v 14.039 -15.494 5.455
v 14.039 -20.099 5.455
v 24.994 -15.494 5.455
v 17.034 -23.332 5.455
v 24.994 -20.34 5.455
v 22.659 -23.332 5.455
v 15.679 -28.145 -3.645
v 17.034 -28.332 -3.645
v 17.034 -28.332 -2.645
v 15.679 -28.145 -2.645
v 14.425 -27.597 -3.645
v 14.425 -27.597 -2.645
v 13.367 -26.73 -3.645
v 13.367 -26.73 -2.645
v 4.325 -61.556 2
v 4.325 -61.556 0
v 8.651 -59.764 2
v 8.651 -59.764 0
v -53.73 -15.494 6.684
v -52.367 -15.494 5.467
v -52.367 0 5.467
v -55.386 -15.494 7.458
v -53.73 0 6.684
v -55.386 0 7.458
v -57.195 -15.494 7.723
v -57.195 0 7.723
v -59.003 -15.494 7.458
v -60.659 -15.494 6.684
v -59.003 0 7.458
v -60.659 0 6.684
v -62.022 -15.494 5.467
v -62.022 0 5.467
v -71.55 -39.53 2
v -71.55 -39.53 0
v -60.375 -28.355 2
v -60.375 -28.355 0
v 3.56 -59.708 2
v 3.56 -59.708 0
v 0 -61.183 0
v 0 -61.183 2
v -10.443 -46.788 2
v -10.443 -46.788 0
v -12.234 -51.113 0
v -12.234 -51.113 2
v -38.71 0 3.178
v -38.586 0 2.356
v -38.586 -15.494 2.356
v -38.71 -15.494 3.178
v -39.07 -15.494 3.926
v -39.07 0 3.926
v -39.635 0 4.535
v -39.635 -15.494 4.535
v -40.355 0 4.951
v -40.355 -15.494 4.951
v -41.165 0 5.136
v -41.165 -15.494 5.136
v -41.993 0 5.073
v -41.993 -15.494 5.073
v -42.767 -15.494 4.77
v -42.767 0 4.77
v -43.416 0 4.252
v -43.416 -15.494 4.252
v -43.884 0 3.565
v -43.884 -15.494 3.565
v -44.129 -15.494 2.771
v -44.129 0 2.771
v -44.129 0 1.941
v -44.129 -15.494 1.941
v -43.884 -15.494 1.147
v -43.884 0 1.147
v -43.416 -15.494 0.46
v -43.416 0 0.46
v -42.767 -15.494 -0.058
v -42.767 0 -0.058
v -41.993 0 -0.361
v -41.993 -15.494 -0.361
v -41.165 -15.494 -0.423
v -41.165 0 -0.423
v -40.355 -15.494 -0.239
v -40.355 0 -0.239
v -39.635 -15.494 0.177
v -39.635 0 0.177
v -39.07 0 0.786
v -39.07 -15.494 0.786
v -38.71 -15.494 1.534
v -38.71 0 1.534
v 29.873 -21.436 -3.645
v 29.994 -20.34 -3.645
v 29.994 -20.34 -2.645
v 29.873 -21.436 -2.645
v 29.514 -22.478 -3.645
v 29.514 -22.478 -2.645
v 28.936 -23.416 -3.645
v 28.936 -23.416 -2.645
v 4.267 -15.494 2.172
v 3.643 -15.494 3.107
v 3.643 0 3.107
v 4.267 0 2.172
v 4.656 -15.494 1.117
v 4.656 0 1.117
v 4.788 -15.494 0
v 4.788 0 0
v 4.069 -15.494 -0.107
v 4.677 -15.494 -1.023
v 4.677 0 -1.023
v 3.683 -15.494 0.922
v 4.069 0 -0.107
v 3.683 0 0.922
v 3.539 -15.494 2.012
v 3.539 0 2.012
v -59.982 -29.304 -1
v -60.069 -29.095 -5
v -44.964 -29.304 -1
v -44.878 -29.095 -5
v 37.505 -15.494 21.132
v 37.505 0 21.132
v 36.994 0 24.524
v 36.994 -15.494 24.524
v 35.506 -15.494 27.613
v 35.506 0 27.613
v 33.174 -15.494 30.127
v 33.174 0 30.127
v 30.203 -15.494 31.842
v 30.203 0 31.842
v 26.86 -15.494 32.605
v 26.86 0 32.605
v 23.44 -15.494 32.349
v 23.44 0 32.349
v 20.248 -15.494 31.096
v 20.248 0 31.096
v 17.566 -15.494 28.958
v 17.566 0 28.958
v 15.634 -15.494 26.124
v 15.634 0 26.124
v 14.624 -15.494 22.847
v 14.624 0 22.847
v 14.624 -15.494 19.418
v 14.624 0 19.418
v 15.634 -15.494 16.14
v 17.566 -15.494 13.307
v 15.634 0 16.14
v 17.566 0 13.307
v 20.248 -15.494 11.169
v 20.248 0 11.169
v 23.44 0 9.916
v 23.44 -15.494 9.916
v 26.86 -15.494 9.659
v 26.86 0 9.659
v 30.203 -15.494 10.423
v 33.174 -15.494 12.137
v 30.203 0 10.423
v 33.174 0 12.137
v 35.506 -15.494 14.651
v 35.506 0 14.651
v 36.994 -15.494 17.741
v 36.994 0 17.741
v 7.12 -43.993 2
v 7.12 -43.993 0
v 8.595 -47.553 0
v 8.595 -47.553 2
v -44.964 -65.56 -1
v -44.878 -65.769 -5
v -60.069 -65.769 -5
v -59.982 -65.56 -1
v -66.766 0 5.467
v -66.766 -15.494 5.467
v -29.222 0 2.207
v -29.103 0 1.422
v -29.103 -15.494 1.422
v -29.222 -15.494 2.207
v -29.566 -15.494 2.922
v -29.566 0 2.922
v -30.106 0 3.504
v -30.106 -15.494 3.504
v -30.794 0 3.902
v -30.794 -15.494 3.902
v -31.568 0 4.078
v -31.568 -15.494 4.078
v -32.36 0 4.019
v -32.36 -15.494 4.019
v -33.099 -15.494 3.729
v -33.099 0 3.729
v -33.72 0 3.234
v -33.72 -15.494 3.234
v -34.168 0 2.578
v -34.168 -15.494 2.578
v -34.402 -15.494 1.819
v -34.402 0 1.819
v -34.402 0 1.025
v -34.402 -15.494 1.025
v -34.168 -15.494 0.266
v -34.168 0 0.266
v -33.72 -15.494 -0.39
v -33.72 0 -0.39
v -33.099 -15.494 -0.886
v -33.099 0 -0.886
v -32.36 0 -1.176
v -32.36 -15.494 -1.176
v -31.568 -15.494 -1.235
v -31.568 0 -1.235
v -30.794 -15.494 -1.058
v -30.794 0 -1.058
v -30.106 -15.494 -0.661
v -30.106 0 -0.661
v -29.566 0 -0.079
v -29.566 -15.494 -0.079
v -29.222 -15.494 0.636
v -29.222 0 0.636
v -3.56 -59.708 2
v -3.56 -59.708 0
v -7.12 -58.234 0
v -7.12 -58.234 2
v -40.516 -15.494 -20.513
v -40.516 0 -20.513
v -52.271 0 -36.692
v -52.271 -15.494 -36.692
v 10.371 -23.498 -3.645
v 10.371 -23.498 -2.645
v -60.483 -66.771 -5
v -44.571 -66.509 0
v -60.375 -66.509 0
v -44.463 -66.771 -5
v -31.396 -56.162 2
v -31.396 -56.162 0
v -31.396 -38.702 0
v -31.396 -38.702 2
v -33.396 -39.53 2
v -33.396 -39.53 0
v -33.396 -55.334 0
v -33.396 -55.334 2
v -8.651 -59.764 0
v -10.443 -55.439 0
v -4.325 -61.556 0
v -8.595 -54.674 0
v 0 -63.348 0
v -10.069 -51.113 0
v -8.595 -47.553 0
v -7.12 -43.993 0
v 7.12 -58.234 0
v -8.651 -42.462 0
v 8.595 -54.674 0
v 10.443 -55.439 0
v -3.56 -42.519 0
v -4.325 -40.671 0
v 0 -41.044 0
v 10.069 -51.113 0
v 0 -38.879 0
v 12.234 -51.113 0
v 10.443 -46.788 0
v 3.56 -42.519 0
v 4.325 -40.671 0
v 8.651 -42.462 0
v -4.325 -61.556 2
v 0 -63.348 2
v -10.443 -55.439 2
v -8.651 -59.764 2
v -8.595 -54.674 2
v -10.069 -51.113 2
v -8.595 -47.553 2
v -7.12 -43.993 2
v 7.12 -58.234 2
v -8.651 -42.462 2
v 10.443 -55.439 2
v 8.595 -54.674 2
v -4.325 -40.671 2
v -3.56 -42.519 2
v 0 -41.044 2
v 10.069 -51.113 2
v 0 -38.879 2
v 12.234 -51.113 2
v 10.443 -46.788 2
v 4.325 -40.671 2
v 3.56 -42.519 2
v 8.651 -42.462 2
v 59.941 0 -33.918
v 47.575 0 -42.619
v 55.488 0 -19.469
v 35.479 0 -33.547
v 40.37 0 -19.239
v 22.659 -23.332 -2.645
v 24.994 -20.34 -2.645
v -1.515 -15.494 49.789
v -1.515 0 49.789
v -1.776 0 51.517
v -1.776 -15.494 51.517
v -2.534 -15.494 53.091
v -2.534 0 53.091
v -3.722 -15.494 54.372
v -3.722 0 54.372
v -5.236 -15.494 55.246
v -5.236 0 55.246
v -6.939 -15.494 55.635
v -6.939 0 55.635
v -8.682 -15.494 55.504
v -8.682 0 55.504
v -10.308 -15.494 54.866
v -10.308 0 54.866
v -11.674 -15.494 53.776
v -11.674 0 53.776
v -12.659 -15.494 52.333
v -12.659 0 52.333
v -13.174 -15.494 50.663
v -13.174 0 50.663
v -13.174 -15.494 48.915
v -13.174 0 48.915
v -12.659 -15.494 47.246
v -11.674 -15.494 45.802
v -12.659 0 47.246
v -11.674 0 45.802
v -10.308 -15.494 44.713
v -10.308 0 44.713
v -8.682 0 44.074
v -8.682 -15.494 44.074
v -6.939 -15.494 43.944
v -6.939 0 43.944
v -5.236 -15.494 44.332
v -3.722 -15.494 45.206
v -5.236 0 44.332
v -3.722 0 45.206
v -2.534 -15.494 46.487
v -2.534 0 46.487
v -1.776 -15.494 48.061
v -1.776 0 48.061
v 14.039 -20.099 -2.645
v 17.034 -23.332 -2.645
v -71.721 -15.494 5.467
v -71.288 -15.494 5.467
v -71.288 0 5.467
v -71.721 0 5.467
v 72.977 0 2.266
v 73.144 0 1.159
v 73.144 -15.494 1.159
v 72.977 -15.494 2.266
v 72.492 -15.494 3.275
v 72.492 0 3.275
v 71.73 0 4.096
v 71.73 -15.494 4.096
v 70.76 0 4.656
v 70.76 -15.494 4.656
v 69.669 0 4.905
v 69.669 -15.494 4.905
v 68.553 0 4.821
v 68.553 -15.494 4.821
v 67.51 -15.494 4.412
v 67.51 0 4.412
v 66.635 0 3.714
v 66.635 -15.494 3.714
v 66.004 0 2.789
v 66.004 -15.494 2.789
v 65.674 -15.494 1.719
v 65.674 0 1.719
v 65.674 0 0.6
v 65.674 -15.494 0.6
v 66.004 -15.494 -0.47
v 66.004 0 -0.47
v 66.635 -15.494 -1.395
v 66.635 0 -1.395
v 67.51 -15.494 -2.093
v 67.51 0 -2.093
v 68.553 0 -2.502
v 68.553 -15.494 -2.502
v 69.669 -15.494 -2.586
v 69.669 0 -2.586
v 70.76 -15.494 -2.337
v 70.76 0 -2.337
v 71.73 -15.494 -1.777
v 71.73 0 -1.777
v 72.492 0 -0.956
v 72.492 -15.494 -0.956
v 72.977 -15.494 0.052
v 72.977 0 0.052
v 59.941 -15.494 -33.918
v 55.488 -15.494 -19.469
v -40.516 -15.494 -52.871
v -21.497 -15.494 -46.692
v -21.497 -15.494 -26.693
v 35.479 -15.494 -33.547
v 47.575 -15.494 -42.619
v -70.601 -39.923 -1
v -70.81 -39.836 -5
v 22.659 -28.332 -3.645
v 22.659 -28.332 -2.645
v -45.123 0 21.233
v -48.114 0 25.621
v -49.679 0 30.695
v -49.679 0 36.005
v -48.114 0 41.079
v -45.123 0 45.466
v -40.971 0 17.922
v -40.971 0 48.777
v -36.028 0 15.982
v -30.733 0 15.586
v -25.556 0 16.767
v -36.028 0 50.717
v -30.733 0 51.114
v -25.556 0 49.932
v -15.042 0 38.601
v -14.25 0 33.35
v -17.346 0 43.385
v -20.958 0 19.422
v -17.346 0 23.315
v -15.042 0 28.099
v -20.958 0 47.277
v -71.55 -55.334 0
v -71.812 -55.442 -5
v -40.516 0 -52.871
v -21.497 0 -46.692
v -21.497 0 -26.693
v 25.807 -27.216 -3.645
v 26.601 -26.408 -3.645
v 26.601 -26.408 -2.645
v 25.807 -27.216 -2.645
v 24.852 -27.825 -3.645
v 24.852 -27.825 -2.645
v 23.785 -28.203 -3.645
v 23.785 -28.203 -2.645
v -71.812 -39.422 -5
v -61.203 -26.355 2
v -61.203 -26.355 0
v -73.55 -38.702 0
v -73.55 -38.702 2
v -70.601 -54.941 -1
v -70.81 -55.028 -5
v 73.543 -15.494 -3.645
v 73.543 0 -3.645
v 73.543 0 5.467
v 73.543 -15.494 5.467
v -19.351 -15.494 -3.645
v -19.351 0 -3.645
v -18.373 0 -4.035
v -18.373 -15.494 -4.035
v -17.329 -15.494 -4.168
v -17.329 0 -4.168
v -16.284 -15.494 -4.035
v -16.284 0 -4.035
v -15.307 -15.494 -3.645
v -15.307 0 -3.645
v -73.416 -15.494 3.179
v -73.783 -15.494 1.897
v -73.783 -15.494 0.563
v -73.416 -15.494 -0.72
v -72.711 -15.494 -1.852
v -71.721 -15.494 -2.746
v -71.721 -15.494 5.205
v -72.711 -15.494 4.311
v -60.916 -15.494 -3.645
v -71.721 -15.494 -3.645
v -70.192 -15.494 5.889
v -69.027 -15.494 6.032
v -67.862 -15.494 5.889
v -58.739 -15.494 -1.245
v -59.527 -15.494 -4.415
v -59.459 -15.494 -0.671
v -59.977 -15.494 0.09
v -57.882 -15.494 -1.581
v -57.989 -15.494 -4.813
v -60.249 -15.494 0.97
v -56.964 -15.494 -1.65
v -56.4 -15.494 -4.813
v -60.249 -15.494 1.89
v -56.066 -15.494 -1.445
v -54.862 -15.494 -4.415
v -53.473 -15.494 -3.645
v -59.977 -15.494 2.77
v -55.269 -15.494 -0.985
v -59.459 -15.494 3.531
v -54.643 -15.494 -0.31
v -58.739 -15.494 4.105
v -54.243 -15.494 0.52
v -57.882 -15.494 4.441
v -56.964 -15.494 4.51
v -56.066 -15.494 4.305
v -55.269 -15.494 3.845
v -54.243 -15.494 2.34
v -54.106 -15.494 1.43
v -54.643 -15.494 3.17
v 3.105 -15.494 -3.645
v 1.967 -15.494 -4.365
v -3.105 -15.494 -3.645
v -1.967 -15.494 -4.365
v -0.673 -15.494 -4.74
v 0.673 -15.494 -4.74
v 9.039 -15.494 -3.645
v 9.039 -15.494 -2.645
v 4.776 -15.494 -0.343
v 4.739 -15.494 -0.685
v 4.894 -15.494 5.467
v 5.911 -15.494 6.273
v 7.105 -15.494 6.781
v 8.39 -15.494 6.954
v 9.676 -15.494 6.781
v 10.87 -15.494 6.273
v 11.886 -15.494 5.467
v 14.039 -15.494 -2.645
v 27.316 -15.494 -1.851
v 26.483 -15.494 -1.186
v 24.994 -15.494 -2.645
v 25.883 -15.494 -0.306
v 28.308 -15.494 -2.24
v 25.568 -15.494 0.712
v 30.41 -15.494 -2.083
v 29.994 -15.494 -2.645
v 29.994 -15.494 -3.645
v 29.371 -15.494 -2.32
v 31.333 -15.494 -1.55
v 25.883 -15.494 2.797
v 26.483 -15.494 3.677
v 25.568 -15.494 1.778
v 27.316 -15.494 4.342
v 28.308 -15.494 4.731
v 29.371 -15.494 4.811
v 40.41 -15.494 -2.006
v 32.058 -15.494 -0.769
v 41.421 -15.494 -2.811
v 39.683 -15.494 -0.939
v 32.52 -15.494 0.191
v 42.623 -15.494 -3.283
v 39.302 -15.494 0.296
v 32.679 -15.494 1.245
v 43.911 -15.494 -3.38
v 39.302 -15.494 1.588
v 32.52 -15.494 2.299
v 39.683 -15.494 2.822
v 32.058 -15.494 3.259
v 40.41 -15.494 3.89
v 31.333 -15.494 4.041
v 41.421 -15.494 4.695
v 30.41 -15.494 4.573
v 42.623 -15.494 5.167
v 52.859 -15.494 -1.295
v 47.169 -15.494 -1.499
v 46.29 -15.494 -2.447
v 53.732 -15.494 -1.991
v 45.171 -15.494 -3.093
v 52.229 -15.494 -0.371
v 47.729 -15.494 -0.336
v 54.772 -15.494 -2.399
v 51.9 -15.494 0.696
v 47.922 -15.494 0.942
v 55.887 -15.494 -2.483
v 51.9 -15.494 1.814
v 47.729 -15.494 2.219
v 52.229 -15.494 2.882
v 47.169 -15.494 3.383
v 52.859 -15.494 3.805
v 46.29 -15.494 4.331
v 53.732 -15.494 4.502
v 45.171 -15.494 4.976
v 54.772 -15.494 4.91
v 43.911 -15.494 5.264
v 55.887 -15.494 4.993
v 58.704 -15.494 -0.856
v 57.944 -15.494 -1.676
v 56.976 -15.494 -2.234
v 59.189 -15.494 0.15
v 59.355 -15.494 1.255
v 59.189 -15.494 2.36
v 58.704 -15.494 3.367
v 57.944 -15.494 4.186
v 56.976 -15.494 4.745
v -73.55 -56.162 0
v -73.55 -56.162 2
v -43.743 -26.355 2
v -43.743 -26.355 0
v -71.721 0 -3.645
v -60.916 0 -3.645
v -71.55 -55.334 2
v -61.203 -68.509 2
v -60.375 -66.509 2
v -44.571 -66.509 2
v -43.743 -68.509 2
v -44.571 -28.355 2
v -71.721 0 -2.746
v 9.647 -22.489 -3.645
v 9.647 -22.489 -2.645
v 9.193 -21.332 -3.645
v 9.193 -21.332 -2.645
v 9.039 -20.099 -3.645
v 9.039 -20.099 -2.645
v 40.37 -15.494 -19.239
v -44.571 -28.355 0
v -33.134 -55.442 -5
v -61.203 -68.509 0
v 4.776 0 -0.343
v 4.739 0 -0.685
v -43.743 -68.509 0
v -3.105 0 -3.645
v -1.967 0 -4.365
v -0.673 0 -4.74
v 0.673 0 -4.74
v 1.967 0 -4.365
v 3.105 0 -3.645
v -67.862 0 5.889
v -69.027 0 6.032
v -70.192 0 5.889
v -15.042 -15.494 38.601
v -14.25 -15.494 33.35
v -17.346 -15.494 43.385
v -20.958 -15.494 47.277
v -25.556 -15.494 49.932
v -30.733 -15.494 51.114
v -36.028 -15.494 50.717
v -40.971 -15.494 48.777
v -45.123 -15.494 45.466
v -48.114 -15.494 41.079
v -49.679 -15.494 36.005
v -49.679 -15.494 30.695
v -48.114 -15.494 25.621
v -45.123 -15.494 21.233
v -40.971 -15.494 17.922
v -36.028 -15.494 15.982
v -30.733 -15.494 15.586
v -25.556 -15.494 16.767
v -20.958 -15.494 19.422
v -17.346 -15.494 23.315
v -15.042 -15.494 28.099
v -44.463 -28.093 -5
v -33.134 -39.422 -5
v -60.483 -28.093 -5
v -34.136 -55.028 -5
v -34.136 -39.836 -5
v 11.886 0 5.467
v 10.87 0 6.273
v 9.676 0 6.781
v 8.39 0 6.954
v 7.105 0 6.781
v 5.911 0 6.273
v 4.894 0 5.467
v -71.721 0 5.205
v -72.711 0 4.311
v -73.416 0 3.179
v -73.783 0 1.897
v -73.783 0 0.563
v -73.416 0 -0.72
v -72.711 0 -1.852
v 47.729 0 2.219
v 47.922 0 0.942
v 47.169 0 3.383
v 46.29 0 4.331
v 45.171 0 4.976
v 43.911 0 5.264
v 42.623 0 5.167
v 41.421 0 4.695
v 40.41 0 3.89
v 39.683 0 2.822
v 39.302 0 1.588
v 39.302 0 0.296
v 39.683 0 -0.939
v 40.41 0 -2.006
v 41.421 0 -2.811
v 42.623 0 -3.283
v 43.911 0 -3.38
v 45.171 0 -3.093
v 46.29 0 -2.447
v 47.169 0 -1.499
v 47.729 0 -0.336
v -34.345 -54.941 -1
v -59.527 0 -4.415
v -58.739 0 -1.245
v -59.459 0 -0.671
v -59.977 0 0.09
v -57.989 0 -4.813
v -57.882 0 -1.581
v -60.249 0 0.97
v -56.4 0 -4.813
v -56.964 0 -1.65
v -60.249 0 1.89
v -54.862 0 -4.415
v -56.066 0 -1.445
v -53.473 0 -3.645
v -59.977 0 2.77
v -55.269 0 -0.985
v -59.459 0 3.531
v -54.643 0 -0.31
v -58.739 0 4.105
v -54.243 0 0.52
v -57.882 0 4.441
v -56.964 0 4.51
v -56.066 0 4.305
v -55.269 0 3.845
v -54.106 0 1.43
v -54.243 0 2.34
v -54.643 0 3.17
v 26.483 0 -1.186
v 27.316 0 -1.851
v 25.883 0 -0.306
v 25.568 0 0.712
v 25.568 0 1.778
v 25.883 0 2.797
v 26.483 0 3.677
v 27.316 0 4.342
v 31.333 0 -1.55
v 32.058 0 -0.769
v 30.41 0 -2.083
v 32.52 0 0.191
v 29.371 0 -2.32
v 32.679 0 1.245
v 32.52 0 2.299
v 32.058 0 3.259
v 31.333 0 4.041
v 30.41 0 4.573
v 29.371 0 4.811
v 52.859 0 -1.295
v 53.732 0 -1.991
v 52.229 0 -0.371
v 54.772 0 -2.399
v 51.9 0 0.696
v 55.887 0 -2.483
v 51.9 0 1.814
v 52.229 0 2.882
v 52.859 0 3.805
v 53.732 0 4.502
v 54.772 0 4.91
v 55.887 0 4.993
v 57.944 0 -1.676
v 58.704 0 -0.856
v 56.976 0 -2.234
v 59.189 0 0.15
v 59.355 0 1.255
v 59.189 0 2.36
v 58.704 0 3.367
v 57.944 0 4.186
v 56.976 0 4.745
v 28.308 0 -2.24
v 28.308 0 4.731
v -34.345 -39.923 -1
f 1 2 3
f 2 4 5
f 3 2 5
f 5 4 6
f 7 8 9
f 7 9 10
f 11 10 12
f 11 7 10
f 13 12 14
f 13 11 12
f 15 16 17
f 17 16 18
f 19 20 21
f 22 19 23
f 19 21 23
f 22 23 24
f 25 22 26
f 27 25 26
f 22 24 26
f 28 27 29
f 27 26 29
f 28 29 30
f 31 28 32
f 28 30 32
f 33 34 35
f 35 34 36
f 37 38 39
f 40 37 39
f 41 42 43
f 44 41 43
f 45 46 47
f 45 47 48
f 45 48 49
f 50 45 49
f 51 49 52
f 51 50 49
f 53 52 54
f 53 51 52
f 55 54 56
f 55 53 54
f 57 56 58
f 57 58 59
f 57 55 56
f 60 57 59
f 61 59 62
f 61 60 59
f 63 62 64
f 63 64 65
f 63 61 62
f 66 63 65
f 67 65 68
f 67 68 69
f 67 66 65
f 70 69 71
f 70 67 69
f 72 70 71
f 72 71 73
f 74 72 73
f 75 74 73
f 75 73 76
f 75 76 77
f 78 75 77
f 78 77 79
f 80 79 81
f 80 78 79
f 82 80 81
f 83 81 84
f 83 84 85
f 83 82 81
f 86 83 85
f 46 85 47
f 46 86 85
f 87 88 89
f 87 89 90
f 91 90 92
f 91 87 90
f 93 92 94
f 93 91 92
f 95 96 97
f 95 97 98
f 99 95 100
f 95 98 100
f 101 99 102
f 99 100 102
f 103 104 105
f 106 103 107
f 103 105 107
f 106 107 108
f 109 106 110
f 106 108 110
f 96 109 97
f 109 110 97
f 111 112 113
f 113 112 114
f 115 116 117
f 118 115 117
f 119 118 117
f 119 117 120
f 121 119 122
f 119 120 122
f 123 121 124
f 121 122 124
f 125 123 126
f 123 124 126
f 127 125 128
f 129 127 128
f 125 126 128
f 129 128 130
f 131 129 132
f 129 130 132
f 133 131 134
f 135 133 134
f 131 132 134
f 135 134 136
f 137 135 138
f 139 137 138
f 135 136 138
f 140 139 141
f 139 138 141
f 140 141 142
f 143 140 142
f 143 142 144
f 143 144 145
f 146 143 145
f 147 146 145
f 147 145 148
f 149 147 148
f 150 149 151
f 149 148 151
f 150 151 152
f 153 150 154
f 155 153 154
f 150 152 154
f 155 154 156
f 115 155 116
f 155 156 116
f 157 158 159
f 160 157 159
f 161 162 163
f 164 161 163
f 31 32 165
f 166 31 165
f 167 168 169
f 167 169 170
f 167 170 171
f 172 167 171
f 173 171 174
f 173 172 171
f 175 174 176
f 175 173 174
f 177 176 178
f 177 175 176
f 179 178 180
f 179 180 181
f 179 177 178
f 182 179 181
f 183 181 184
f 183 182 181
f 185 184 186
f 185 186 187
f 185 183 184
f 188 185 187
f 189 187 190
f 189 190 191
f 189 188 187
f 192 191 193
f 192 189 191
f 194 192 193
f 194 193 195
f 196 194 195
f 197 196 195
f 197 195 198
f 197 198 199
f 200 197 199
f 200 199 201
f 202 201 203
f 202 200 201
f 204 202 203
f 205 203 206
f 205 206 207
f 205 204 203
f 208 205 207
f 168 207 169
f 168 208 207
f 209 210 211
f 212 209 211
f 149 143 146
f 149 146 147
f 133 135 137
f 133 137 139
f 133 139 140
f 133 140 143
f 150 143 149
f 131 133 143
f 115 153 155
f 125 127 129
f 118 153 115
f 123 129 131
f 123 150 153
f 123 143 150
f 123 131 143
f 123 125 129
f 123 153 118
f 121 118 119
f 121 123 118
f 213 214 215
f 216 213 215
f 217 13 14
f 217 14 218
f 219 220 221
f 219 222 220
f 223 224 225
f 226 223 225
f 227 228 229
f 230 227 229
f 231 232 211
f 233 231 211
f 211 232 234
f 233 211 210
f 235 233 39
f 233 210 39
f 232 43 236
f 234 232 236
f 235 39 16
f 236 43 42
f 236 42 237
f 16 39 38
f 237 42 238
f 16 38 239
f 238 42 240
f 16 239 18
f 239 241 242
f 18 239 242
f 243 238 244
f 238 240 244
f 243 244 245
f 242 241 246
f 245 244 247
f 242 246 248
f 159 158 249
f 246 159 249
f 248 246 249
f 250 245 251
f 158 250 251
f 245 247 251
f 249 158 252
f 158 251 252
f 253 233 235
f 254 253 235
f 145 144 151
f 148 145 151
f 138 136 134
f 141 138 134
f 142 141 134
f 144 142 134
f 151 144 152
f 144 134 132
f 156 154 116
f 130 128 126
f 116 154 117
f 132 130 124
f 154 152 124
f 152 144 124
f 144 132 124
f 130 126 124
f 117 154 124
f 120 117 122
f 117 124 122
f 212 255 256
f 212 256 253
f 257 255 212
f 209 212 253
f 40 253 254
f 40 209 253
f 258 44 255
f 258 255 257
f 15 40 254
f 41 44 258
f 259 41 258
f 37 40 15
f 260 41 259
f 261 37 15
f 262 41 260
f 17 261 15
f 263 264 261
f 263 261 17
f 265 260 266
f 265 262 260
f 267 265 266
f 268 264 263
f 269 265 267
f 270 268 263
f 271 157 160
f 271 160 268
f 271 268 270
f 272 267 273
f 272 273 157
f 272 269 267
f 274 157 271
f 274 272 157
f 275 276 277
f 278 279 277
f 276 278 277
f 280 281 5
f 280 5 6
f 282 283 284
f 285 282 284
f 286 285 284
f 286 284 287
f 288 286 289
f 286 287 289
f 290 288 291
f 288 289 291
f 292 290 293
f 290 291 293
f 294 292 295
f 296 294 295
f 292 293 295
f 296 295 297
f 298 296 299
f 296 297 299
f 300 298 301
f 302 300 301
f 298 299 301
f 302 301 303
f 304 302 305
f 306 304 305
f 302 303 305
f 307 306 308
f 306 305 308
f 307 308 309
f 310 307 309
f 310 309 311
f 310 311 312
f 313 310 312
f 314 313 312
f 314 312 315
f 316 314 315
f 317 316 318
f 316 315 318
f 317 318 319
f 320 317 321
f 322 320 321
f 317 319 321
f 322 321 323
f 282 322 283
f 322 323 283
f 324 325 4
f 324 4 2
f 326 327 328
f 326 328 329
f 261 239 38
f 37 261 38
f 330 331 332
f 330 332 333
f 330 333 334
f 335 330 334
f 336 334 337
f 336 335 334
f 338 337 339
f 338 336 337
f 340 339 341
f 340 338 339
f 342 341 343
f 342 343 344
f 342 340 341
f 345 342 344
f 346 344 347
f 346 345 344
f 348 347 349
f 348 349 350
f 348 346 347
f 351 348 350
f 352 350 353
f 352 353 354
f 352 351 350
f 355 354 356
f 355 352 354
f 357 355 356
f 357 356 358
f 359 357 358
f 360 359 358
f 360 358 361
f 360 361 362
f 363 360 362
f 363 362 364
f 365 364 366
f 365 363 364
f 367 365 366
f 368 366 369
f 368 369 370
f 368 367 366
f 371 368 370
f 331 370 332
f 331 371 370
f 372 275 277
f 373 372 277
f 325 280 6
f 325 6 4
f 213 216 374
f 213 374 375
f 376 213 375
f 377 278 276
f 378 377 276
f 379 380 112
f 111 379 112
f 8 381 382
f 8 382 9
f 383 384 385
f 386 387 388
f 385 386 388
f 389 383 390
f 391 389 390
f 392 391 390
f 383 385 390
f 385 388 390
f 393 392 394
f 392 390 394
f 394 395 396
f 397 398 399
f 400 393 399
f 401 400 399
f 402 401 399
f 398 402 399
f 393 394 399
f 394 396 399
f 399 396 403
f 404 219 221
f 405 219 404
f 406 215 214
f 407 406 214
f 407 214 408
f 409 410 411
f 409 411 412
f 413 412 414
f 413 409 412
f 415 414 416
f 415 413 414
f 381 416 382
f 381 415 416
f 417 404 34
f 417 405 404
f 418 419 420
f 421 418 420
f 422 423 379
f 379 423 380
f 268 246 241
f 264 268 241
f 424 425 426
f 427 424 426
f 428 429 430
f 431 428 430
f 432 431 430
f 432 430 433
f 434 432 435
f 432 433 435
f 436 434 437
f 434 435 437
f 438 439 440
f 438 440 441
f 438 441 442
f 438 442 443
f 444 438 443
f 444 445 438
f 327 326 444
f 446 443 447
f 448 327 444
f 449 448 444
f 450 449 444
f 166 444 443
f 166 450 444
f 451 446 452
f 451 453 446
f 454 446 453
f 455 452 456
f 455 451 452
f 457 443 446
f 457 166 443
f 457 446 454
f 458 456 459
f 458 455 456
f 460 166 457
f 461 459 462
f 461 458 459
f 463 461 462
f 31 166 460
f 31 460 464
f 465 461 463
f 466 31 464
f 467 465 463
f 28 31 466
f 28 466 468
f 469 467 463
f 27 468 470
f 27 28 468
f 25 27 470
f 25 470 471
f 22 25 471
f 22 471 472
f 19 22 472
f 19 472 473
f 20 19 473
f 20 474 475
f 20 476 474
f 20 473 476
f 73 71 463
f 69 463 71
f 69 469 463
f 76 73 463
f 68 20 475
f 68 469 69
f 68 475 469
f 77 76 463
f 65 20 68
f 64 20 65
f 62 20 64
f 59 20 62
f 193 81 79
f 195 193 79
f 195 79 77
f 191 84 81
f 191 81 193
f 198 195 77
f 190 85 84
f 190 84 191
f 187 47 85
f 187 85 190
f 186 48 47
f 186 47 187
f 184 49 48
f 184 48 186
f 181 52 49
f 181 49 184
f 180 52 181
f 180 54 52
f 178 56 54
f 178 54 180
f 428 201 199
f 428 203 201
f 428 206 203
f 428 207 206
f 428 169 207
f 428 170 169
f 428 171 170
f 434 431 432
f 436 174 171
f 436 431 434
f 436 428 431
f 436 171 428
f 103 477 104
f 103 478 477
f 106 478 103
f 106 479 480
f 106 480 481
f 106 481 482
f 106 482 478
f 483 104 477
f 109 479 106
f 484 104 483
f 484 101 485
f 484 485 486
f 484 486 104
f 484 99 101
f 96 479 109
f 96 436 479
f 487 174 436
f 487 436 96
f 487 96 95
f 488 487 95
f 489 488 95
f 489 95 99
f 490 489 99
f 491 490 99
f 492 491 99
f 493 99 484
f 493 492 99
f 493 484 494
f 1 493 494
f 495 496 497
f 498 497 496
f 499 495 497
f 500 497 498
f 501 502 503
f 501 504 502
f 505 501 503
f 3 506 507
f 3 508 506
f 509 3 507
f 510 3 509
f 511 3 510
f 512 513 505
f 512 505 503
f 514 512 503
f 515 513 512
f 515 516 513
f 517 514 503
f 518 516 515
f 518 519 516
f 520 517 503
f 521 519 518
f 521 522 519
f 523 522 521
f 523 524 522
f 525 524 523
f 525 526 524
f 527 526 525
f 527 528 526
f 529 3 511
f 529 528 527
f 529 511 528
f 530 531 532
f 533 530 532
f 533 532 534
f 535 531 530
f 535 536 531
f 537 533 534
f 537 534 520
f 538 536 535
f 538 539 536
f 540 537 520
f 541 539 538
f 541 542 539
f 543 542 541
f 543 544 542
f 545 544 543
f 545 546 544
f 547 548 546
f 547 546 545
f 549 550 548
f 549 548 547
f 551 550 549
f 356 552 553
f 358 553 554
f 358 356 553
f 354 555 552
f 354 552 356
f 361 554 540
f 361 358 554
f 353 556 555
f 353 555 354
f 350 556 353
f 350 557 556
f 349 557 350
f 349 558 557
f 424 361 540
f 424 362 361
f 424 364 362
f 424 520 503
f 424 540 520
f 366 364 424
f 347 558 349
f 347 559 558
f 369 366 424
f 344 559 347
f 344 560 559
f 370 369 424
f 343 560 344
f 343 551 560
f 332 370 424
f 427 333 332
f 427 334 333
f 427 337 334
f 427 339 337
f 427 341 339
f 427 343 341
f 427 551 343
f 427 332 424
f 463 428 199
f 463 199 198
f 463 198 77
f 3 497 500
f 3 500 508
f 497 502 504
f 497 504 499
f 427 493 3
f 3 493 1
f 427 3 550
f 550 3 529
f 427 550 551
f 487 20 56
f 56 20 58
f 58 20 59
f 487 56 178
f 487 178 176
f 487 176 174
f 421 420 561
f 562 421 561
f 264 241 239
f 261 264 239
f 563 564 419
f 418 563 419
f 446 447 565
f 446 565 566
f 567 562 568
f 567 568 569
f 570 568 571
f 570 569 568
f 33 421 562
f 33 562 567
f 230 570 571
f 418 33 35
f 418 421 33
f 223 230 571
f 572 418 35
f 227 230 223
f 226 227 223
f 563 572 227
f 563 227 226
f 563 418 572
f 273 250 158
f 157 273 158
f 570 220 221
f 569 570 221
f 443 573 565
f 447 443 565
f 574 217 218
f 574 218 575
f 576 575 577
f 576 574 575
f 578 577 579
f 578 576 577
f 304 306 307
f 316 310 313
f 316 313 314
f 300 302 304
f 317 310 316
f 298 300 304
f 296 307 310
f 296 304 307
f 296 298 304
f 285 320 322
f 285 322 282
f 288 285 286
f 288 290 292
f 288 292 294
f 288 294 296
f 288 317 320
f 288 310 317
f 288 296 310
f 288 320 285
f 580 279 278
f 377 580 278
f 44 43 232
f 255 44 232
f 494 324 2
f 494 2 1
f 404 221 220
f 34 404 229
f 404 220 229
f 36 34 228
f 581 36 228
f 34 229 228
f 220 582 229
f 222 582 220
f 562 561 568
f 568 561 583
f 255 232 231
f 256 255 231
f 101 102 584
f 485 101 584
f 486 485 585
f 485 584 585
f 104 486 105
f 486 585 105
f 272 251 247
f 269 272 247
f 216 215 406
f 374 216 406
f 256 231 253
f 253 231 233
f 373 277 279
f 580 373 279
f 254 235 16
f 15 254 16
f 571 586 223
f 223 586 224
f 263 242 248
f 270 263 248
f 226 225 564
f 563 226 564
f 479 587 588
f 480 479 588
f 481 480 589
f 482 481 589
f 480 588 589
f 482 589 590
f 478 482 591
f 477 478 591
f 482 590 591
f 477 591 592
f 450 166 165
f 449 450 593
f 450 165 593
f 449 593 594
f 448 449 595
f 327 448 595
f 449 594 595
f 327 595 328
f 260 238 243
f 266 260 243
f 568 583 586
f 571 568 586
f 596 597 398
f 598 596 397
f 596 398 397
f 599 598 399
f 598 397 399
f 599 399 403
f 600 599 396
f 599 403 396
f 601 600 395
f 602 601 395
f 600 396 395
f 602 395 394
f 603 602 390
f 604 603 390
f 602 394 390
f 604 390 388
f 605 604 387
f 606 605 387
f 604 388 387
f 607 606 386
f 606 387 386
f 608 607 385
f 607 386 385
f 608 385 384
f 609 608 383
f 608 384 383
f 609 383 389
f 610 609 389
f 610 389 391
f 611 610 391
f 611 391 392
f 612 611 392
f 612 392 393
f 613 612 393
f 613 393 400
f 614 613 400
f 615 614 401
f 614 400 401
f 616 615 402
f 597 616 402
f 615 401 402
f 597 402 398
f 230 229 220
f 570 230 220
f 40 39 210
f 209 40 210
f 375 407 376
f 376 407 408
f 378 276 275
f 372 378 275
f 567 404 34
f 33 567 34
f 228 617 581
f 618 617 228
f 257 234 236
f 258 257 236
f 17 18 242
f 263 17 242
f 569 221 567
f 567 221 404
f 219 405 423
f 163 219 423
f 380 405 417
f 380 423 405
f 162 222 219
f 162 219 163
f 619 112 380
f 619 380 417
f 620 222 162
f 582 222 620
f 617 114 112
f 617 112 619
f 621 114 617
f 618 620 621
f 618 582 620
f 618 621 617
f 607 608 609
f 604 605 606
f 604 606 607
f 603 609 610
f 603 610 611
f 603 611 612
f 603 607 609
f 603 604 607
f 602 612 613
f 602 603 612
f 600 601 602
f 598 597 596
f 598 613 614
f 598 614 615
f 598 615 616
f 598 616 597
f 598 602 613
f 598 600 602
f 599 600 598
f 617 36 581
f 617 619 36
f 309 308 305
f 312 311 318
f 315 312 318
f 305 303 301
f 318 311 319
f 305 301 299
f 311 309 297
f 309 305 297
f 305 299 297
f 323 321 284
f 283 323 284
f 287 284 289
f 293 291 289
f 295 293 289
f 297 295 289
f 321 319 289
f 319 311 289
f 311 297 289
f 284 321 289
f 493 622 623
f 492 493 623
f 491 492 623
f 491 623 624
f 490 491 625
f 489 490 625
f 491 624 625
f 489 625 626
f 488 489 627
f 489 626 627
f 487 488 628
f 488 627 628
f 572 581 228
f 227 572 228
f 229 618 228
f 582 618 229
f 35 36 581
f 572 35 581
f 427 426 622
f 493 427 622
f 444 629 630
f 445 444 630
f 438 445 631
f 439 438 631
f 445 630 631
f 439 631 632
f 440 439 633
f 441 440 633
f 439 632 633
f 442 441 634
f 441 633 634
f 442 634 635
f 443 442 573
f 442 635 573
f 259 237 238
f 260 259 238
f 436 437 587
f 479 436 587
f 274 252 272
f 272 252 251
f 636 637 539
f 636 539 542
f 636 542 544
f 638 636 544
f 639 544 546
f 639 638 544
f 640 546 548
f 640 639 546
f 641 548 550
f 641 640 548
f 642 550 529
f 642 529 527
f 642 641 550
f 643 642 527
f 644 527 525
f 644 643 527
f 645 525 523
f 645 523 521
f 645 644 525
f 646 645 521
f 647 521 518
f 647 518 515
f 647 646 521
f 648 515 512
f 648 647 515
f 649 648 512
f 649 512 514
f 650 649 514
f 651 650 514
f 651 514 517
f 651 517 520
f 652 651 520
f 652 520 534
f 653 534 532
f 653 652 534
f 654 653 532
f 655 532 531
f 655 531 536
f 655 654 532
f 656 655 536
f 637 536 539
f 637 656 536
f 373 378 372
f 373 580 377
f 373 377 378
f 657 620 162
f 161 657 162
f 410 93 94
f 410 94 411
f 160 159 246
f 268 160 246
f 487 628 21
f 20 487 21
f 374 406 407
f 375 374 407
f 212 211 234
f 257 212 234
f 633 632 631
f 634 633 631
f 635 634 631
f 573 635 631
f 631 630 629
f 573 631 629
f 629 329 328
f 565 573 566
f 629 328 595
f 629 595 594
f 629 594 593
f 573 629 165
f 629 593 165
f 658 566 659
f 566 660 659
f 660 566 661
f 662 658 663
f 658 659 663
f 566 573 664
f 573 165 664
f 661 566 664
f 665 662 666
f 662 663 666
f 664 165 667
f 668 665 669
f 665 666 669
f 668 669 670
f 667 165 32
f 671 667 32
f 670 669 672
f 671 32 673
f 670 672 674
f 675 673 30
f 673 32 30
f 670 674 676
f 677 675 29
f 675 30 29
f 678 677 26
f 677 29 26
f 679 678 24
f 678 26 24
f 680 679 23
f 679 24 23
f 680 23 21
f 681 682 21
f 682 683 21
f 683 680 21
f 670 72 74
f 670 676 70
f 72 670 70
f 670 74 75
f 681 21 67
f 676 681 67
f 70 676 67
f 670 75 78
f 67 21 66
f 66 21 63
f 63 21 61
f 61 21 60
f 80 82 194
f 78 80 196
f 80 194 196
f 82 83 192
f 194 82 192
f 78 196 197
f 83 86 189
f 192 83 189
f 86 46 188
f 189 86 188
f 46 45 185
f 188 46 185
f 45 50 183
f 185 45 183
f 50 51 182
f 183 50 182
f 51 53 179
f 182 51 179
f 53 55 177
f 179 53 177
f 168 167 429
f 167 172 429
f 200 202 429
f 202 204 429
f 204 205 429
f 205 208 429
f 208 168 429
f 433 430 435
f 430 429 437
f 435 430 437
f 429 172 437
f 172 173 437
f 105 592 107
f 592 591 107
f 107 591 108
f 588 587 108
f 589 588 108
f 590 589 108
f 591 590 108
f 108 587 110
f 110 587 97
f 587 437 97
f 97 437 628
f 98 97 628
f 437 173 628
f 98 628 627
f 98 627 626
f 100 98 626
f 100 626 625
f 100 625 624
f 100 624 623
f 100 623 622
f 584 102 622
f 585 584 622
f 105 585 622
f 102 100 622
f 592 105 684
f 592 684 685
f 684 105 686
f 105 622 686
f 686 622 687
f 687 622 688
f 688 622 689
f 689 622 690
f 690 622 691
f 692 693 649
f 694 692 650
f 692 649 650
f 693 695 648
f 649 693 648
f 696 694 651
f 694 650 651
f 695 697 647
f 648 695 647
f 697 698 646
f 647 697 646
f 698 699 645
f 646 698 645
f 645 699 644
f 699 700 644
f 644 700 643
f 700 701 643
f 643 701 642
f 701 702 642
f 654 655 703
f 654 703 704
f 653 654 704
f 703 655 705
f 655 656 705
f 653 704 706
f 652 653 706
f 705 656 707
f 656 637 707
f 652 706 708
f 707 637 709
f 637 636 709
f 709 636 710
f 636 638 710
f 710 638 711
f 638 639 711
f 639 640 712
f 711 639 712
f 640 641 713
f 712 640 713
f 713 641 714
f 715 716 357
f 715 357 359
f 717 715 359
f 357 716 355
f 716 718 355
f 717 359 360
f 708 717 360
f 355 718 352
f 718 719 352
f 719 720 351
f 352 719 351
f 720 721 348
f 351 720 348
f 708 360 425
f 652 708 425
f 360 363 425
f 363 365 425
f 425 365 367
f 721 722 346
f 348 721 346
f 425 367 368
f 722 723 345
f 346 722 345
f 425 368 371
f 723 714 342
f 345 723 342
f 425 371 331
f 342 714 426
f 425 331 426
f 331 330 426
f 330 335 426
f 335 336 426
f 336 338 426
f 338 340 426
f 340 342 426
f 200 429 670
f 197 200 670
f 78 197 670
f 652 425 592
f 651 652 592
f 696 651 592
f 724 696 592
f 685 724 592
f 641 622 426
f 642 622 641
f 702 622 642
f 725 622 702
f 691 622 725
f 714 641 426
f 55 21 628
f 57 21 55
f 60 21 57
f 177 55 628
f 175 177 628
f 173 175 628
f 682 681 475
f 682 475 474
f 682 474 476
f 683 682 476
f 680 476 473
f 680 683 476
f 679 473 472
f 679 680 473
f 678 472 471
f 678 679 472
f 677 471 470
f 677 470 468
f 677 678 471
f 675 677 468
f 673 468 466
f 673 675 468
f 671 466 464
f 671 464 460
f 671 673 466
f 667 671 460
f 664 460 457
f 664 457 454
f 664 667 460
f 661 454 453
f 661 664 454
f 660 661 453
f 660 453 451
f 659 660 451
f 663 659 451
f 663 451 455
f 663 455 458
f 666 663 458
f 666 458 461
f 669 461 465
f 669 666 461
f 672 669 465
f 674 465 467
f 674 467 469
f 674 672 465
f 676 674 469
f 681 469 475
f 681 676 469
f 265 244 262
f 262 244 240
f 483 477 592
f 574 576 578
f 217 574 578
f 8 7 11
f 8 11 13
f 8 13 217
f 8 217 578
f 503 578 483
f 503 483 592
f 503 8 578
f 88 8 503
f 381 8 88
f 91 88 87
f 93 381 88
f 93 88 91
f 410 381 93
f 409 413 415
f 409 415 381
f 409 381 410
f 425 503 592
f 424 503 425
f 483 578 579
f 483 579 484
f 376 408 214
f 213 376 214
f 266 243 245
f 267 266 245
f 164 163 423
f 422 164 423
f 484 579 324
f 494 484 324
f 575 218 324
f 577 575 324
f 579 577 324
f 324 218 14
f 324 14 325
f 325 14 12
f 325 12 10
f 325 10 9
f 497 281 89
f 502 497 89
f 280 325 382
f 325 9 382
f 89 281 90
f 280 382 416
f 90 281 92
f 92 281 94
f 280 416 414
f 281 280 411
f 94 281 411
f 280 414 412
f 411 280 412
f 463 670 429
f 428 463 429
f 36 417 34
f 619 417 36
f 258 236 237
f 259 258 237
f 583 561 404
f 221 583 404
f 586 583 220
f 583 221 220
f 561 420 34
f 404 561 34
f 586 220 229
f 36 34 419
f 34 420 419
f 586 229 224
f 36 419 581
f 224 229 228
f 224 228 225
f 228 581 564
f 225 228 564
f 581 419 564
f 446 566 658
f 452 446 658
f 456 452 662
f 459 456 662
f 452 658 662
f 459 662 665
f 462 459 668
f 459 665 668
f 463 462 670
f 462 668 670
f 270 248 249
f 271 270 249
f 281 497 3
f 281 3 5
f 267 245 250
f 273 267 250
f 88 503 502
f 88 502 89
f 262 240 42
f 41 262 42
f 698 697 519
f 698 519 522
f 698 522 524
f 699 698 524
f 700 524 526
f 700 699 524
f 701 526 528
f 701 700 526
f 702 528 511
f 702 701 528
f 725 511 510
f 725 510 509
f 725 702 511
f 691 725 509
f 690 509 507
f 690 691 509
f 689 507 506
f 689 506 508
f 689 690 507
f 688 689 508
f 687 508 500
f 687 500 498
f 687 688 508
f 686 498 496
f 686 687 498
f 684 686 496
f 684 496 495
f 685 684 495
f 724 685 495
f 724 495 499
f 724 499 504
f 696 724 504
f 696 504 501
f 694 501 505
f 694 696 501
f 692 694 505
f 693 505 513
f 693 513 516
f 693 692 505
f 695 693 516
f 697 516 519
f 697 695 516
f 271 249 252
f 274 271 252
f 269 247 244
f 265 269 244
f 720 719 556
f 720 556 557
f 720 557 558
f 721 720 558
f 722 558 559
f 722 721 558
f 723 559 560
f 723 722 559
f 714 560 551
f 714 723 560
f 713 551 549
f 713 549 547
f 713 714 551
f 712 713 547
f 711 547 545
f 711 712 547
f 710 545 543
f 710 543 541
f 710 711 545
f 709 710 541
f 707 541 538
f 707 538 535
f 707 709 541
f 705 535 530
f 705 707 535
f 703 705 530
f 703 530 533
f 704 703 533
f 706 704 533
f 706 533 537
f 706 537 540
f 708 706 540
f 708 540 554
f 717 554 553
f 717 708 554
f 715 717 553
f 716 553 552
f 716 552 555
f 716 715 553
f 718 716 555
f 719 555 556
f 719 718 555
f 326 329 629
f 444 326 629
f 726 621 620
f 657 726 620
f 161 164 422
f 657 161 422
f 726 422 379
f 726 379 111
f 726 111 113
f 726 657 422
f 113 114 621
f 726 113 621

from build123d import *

# Parameters (mm, degrees)
F0_R     = 17.8139800412
F1_DEPTH = 15.494
F0_R_2   = 11.5051487887
F0_R_3   = 5.8619659801
F0_R_4   = 3.0887061563
F0_R_5   = 2.7872555457
F0_R_6   = 2.6641177262
F0_R_7   = 3.5752749696
F0_R_8   = 4.3340936332
F0_R_9   = 3.7486076205
F0_R_10  = 3.7558182647
F3_DEPTH = 9.1
F4_DEPTH = 1
F6_DEPTH = 2
F8_DEPTH = 5
F8_TAPER = -3
F9_T     = -1


with BuildPart() as f1:
    # F0 (on Front) → F1 (new body)
    with BuildSketch(Plane.XZ):
        with Locations((-32.0643559098, 33.3498455584)):
            Circle(F0_R)
    extrude(amount=F1_DEPTH)


with BuildPart() as f1b:
    # F0 (on Front) → F1, piece 2 (new body)
    with BuildSketch(Plane.XZ):
        with Locations((26.0001858672, 21.1323804719)):
            Circle(F0_R_2)
    extrude(amount=F1_DEPTH)


with BuildPart() as f1c:
    # F0 (on Front) → F1, piece 3 (new body)
    with BuildSketch(Plane.XZ):
        Polygon((-21.4965865016, -32.4069848968), (-21.4965865016, -26.6931748016), (-40.5161358874, -20.5133485927), (-52.2708638586, -36.6923436522), (-40.5161358874, -52.8713387118), (-21.4965865016, -46.6915125029), (-21.4965865016, -40.9777024077), align=None)
    extrude(amount=F1_DEPTH)


with BuildPart() as f1d:
    # F0 (on Front) → F1, piece 4 (new body)
    with BuildSketch(Plane.XZ):
        with Locations((-7.3773595504, 49.7891530395)):
            Circle(F0_R_3)
    extrude(amount=F1_DEPTH)


with BuildPart() as f1e:
    # F0 (on Front) → F1, piece 5 (new body)
    with BuildSketch(Plane.XZ):
        Polygon((47.5753079159, -42.618838899), (59.94121926, -33.9183529688), (55.4878421774, -19.4690743935), (40.3695924316, -19.2394150511), (35.4793773209, -33.5467563471), align=None)
    extrude(amount=F1_DEPTH)


with BuildPart() as f1f:
    # F0 (on Front) → F1, piece 6 (new body)
    with BuildSketch(Plane.XZ):
        with BuildLine():
            Line((-71.2875978137, 5.4669422098), (-71.7210769653, 5.4669422098))
            Line((-71.7210769653, 5.4669422098), (-71.7210769653, 5.2054185065))
            ThreePointArc((-71.7210769653, 5.2054185065), (-71.5077857348, 5.341896038), (-71.2875978137, 5.4669422098))
        make_face()
        with BuildLine():
            ThreePointArc((-66.7660131072, 5.4669422098), (-69.0268054605, 6.032338058), (-71.2875978137, 5.4669422098))
            Line((-71.2875978137, 5.4669422098), (-66.7660131072, 5.4669422098))
        make_face()
        with BuildLine():
            Line((-66.7660131072, 5.4669422098), (-71.2875978137, 5.4669422098))
            ThreePointArc((-71.2875978137, 5.4669422098), (-71.5077857348, 5.341896038), (-71.7210769653, 5.2054185065))
            Line((-71.7210769653, 5.2054185065), (-71.7210769653, -2.7461446001))
            ThreePointArc((-71.7210769653, -2.7461446001), (-66.7766768898, -3.0133406943), (-64.2241043557, 1.2296369532))
            ThreePointArc((-64.2241043557, 1.2296369532), (-64.9083198265, 3.700267234), (-66.7660131072, 5.4669422098))
        make_face()
        with BuildLine():
            Line((-71.7210769653, -2.7461446001), (-71.7210769653, 5.2054185065))
            ThreePointArc((-71.7210769653, 5.2054185065), (-73.8295065652, 1.2296369532), (-71.7210769653, -2.7461446001))
        make_face()
        with BuildLine():
            Line((-62.0222794174, 5.4669422098), (-66.7660131072, 5.4669422098))
            ThreePointArc((-66.7660131072, 5.4669422098), (-64.9083198265, 3.700267234), (-64.2241043557, 1.2296369532))
            ThreePointArc((-64.2241043557, 1.2296369532), (-66.7766768898, -3.0133406943), (-71.7210769653, -2.7461446001))
            Line((-71.7210769653, -2.7461446001), (-71.7210769653, -3.6446282174))
            Line((-71.7210769653, -3.6446282174), (-60.9164853511, -3.6446282174))
            ThreePointArc((-60.9164853511, -3.6446282174), (-63.4419095605, 0.6717680934), (-62.0222794174, 5.4669422098))
        make_face()
        with BuildLine():
            ThreePointArc((-52.3668868185, 5.4669422098), (-57.194583118, 7.7231186661), (-62.0222794174, 5.4669422098))
            Line((-62.0222794174, 5.4669422098), (-52.3668868185, 5.4669422098))
        make_face()
        with BuildLine():
            Line((-52.3668868185, 5.4669422098), (-62.0222794174, 5.4669422098))
            ThreePointArc((-62.0222794174, 5.4669422098), (-63.4419095605, 0.6717680934), (-60.9164853511, -3.6446282174))
            Line((-60.9164853511, -3.6446282174), (-53.4726808848, -3.6446282174))
            ThreePointArc((-53.4726808848, -3.6446282174), (-51.5809176909, -1.4144611563), (-50.9014175986, 1.4299531467))
            ThreePointArc((-50.9014175986, 1.4299531467), (-51.2791193093, 3.5773283311), (-52.3668868185, 5.4669422098))
        make_face()
        with Locations((-57.194583118, 1.4299531467)):
            Circle(F0_R_4, mode=Mode.SUBTRACT)
        with BuildLine():
            Line((4.8944315217, 5.4669422098), (-52.3668868185, 5.4669422098))
            ThreePointArc((-52.3668868185, 5.4669422098), (-51.2791193093, 3.5773283311), (-50.9014175986, 1.4299531467))
            ThreePointArc((-50.9014175986, 1.4299531467), (-51.5809176909, -1.4144611563), (-53.4726808848, -3.6446282174))
            Line((-53.4726808848, -3.6446282174), (-19.3505987984, -3.6446282174))
            ThreePointArc((-19.3505987984, -3.6446282174), (-19.4434185248, 3.5915665557), (-13.1607614458, 0))
            ThreePointArc((-13.1607614458, 0), (-13.737107418, -2.1147445511), (-15.3067491489, -3.6446282174))
            Line((-15.3067491489, -3.6446282174), (-3.1048294077, -3.6446282174))
            ThreePointArc((-3.1048294077, -3.6446282174), (-3.3863899314, 3.3846186974), (3.6430033287, 3.1067357855))
            ThreePointArc((3.6430033287, 3.1067357855), (4.1031027455, 4.374651181), (4.8944315217, 5.4669422098))
        make_face()
        with Locations((-41.3732565939, 2.3560577538)):
            Circle(F0_R_5, mode=Mode.SUBTRACT)
        with Locations((-31.7674353719, 1.4215917327)):
            Circle(F0_R_6, mode=Mode.SUBTRACT)
        with BuildLine():
            Line((-53.4726808848, -3.6446282174), (-60.9164853511, -3.6446282174))
            ThreePointArc((-60.9164853511, -3.6446282174), (-57.194583118, -4.8632123727), (-53.4726808848, -3.6446282174))
        make_face()
        with BuildLine():
            ThreePointArc((11.8863267549, 5.4669422098), (8.3903791383, 6.9540981905), (4.8944315217, 5.4669422098))
            Line((4.8944315217, 5.4669422098), (11.8863267549, 5.4669422098))
        make_face()
        with BuildLine():
            Line((11.8863267549, 5.4669422098), (4.8944315217, 5.4669422098))
            ThreePointArc((4.8944315217, 5.4669422098), (4.1031027455, 4.374651181), (3.6430033287, 3.1067357855))
            ThreePointArc((3.6430033287, 3.1067357855), (4.4925130813, 1.6554777885), (4.7878262807, 0))
            ThreePointArc((4.7878262807, 0), (4.7601132197, -0.5143954019), (4.6772948562, -1.0228359214))
            ThreePointArc((4.6772948562, -1.0228359214), (10.0531913375, -2.4574102008), (13.2430250061, 2.1014523227))
            ThreePointArc((13.2430250061, 2.1014523227), (12.8910883976, 3.915780871), (11.8863267549, 5.4669422098))
        make_face()
        with BuildLine():
            Line((73.5433921218, 5.4669422098), (11.8863267549, 5.4669422098))
            ThreePointArc((11.8863267549, 5.4669422098), (12.8910883976, 3.915780871), (13.2430250061, 2.1014523227))
            ThreePointArc((13.2430250061, 2.1014523227), (10.0531913375, -2.4574102008), (4.6772948562, -1.0228359214))
            ThreePointArc((4.6772948562, -1.0228359214), (4.1059485172, -2.4626139098), (3.1048294077, -3.6446282174))
            Line((3.1048294077, -3.6446282174), (73.5433921218, -3.6446282174))
            Line((73.5433921218, -3.6446282174), (73.5433921218, 5.4669422098))
        make_face()
        with Locations((29.1037913412, 1.2453256641)):
            Circle(F0_R_7, mode=Mode.SUBTRACT)
        with Locations((43.5876064003, 0.941987324)):
            Circle(F0_R_8, mode=Mode.SUBTRACT)
        with Locations((55.6066073477, 1.2551748659)):
            Circle(F0_R_9, mode=Mode.SUBTRACT)
        with Locations((69.3883225322, 1.1593680829)):
            Circle(F0_R_10, mode=Mode.SUBTRACT)
        with BuildLine():
            ThreePointArc((4.6772948562, -1.0228359214), (3.683130806, 0.9224760478), (3.6430033287, 3.1067357855))
            ThreePointArc((3.6430033287, 3.1067357855), (-3.3863899314, 3.3846186974), (-3.1048294077, -3.6446282174))
            Line((-3.1048294077, -3.6446282174), (3.1048294077, -3.6446282174))
            ThreePointArc((3.1048294077, -3.6446282174), (4.1059485172, -2.4626139098), (4.6772948562, -1.0228359214))
        make_face()
        with BuildLine():
            ThreePointArc((-13.1607614458, 0), (-19.4434185248, 3.5915665557), (-19.3505987984, -3.6446282174))
            Line((-19.3505987984, -3.6446282174), (-15.3067491489, -3.6446282174))
            ThreePointArc((-15.3067491489, -3.6446282174), (-13.737107418, -2.1147445511), (-13.1607614458, 0))
        make_face()
        with BuildLine():
            Line((-15.3067491489, -3.6446282174), (-19.3505987984, -3.6446282174))
            ThreePointArc((-19.3505987984, -3.6446282174), (-17.3286739737, -4.1679125279), (-15.3067491489, -3.6446282174))
        make_face()
        with BuildLine():
            Line((3.1048294077, -3.6446282174), (-3.1048294077, -3.6446282174))
            ThreePointArc((-3.1048294077, -3.6446282174), (0, -4.7878262807), (3.1048294077, -3.6446282174))
        make_face()
    extrude(amount=F1_DEPTH)

    # F2 (on face) → F3 (join)
    with BuildSketch(Plane(origin=(0, 0, -3.6446282174), x_dir=(1, 0, 0), z_dir=(0, 0, -1))):
        Polygon((14.038509801, 20.099441715), (14.038509801, 15.494), (24.9944411963, 15.494), (24.9944411963, 20.3399387295), (22.6594273512, 23.3316746354), (17.0342370776, 23.3316746354), align=None)
    extrude(amount=-F3_DEPTH)

    # F2 (on face) → F4 (join)
    with BuildSketch(Plane(origin=(0, 0, -3.6446282174), x_dir=(1, 0, 0), z_dir=(0, 0, -1))):
        with BuildLine():
            Line((9.038509801, 20.099441715), (9.038509801, 15.494))
            Line((9.038509801, 15.494), (14.038509801, 15.494))
            Line((14.038509801, 15.494), (14.038509801, 20.099441715))
            Line((14.038509801, 20.099441715), (17.0342370776, 23.3316746354))
            Line((17.0342370776, 23.3316746354), (22.6594273512, 23.3316746354))
            Line((22.6594273512, 23.3316746354), (24.9944411963, 20.3399387295))
            Line((24.9944411963, 20.3399387295), (24.9944411963, 15.494))
            Line((24.9944411963, 15.494), (29.9944411963, 15.494))
            Line((29.9944411963, 15.494), (29.9944411963, 20.3399387295))
            ThreePointArc((29.9944411963, 20.3399387295), (29.7224372376, 21.9666081592), (28.9360198229, 23.4162933791))
            Line((28.9360198229, 23.4162933791), (26.6010059778, 26.408029285))
            ThreePointArc((26.6010059778, 26.408029285), (24.852396429, 27.8251016821), (22.6594273512, 28.3316746354))
            Line((22.6594273512, 28.3316746354), (17.0342370776, 28.3316746354))
            ThreePointArc((17.0342370776, 28.3316746354), (15.0335014878, 27.9139292224), (13.3670851442, 26.7304974754))
            Line((13.3670851442, 26.7304974754), (10.3713578676, 23.4982645549))
            ThreePointArc((10.3713578676, 23.4982645549), (9.3836328066, 21.9248513036), (9.038509801, 20.099441715))
        make_face()
    extrude(amount=-F4_DEPTH)


with BuildPart() as f6:
    # F5 (on Top) → F6 (new body)
    with BuildSketch(Plane.XY):
        Polygon((12.2342839544, -51.1133961294), (10.4426145507, -46.7879235559), (8.6509451471, -42.4624509823), (4.3254725735, -40.6707815787), (0, -38.8791121751), (-4.3254725735, -40.6707815787), (-8.6509451471, -42.4624509823), (-10.4426145507, -46.7879235559), (-12.2342839544, -51.1133961294), (-10.4426145507, -55.438868703), (-8.6509451471, -59.7643412765), (-4.3254725735, -61.5560106802), (0, -63.3476800838), (4.3254725735, -61.5560106802), (8.6509451471, -59.7643412765), (10.4426145507, -55.438868703), align=None)
        Polygon((0, -41.0438969928), (3.5601055613, -42.5185409998), (7.1202111227, -43.9931850067), (8.5948551297, -47.5532905681), (10.0694991366, -51.1133961294), (8.5948551297, -54.6735016908), (7.1202111227, -58.2336072521), (3.5601055613, -59.7082512591), (0, -61.1828952661), (-3.5601055613, -59.7082512591), (-7.1202111227, -58.2336072521), (-8.5948551297, -54.6735016908), (-10.0694991366, -51.1133961294), (-8.5948551297, -47.5532905681), (-7.1202111227, -43.9931850067), (-3.5601055613, -42.5185409998), align=None, mode=Mode.SUBTRACT)
    extrude(amount=F6_DEPTH)


with BuildPart() as f6b:
    # F5 (on Top) → F6, piece 2 (new body)
    with BuildSketch(Plane.XY):
        Polygon((-43.7428559218, -68.5087683652), (-31.3964133109, -56.1623257543), (-31.3964133109, -38.701819167), (-43.7428559218, -26.3553765561), (-61.2033625092, -26.3553765561), (-73.5498051201, -38.701819167), (-73.5498051201, -56.1623257543), (-61.2033625092, -68.5087683652), align=None)
        Polygon((-60.3749344297, -66.5087660603), (-71.5498028151, -55.3338976749), (-71.5498028151, -39.5302472464), (-60.3749344297, -28.355378861), (-44.5712840013, -28.355378861), (-33.3964156159, -39.5302472464), (-33.3964156159, -55.3338976749), (-44.5712840013, -66.5087660603), align=None, mode=Mode.SUBTRACT)
    extrude(amount=F6_DEPTH)


with BuildPart() as f8:
    # F7 (on face) → F8 (new body)
    with BuildSketch(Plane(origin=(0, 0, 0), x_dir=(1, 0, 0), z_dir=(0, 0, -1))):
        Polygon((-60.3749344297, 66.5087660603), (-71.5498028151, 55.3338976749), (-71.5498028151, 39.5302472464), (-60.3749344297, 28.355378861), (-44.5712840013, 28.355378861), (-33.3964156159, 39.5302472464), (-33.3964156159, 55.3338976749), (-44.5712840013, 66.5087660603), align=None)
    extrude(amount=F8_DEPTH, taper=F8_TAPER)

    # F9
    f9_openings = [f8.faces().sort_by_distance(p)[0] for p in [
        (-52.473109, -47.432072, -5),
    ]]
    offset(amount=F9_T, openings=f9_openings)


solid = Compound([f1.part, f1b.part, f1c.part, f1d.part, f1e.part, f1f.part, f6.part, f6b.part, f8.part])
